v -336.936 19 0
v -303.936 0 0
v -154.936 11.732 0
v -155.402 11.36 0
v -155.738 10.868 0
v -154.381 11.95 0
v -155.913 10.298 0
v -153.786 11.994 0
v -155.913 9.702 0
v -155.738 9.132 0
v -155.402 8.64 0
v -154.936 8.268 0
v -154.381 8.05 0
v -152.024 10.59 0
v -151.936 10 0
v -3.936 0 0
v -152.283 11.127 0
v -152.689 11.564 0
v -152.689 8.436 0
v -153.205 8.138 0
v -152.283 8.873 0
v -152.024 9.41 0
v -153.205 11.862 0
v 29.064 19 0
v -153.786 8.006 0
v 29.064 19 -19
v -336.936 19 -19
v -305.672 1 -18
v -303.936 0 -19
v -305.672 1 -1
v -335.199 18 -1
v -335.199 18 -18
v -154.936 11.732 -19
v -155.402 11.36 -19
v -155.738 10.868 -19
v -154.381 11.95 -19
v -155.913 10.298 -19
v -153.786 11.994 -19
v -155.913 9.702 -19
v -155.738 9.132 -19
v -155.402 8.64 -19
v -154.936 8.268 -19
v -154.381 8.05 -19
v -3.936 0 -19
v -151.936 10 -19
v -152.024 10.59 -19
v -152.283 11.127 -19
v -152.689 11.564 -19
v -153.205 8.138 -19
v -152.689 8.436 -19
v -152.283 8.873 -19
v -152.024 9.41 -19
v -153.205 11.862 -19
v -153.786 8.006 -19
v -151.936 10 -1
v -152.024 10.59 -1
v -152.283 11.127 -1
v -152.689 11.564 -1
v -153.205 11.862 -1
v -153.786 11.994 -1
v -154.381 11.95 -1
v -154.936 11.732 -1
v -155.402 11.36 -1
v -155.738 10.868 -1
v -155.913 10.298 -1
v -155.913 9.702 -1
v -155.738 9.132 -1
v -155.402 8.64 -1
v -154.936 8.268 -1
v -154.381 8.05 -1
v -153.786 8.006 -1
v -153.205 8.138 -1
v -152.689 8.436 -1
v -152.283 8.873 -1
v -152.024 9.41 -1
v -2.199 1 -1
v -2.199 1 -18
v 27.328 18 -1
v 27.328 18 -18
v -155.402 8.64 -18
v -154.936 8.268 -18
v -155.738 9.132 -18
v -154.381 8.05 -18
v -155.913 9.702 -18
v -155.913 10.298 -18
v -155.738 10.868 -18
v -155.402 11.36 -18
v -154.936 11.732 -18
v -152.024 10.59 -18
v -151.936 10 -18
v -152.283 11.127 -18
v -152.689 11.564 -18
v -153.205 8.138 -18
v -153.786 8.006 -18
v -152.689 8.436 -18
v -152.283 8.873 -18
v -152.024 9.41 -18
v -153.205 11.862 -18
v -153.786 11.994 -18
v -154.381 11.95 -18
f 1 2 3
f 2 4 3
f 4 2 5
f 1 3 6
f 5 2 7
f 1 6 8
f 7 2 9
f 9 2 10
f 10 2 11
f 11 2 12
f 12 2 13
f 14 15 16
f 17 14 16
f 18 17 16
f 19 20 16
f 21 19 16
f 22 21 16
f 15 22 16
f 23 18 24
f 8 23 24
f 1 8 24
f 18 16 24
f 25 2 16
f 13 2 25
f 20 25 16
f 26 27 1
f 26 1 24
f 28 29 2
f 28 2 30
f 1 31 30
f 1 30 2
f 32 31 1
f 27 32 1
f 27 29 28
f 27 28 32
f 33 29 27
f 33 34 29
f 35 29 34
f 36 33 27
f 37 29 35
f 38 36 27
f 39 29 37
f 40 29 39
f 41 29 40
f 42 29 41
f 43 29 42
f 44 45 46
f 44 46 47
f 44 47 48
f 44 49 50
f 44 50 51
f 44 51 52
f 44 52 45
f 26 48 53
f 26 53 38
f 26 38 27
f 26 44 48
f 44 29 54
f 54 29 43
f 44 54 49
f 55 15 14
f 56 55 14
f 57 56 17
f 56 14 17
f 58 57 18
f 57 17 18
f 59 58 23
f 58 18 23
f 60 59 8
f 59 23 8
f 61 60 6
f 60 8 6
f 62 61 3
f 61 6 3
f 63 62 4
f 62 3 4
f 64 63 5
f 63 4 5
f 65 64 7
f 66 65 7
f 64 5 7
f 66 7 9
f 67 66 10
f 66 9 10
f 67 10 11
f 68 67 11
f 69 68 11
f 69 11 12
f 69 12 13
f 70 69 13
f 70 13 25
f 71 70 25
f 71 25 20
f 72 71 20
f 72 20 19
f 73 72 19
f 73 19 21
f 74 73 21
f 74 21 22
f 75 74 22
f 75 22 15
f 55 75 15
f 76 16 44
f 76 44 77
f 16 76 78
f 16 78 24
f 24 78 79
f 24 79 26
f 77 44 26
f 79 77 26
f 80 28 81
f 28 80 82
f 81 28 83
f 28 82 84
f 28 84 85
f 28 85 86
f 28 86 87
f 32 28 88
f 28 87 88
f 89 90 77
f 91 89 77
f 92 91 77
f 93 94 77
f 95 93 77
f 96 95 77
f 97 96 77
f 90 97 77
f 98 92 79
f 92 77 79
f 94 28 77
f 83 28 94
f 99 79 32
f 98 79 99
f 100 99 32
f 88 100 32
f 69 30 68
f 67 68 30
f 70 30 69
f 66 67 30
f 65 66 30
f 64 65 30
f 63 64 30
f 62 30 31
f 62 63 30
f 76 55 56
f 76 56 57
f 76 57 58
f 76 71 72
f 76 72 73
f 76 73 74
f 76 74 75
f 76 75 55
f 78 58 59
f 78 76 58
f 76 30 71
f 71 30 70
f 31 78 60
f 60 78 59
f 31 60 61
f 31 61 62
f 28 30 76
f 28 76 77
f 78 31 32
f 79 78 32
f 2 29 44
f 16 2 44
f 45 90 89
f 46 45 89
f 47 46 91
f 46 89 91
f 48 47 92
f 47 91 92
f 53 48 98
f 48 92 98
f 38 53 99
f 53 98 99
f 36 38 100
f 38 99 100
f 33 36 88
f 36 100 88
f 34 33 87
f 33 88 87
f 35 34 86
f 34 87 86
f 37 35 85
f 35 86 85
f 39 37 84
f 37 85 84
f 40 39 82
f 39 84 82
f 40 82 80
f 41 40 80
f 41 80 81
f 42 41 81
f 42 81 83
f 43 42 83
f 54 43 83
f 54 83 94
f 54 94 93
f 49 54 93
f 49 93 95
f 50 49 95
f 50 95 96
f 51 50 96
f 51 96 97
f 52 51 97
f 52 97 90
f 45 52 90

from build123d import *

# Parameters (mm, degrees)
SKETCH1_W           = 366
SKETCH1_H           = 19
BOSS_EXTRUDE2_DEPTH = 19
SKETCH9_W           = 17
SKETCH9_H           = 17
CUT_EXTRUDE4_DEPTH  = 367.985013318
CUT_EXTRUDE6_DEPTH  = 339.005366679
SKETCH12_R          = 2
CUT_EXTRUDE7_DEPTH  = 339.005366679


with BuildPart() as part:
    # Sketch1 → Boss-Extrude2 (new body)
    with BuildSketch(Plane(origin=(0, 0, 0), x_dir=(1, 0, 0), z_dir=(0, 1, 0))):
        with Locations((-153.935643564, 9.5)):
            Rectangle(SKETCH1_W, SKETCH1_H)
    extrude(amount=BOSS_EXTRUDE2_DEPTH)

    # Sketch9 → Cut-Extrude4 (cut, through all)
    with BuildSketch(Plane(origin=(29.064356436, 0, 0), x_dir=(0, 0, -1), z_dir=(1, 0, 0))):
        with Locations((9.5, 9.5)):
            Rectangle(SKETCH9_W, SKETCH9_H)
    extrude(amount=-CUT_EXTRUDE4_DEPTH, mode=Mode.SUBTRACT)

    # Sketch11 → Cut-Extrude6 (cut, through all)
    with BuildSketch(Plane(origin=(0, 0, -19), x_dir=(-1, 0, 0), z_dir=(0, 0, -1))):
        Polygon((-29.064356436, 19), (-29.064356436, 0), (3.935643564, 0), align=None)
        Polygon((336.935643564, 19), (336.935643564, 0), (303.935643564, 0), align=None)
    extrude(amount=-CUT_EXTRUDE6_DEPTH, mode=Mode.SUBTRACT)

    # Sketch12 → Cut-Extrude7 (cut, through all)
    with BuildSketch(Plane.XY):
        with Locations((-153.935643564, 10)):
            Circle(SKETCH12_R)
    extrude(amount=-CUT_EXTRUDE7_DEPTH, mode=Mode.SUBTRACT)


solid = part.part
